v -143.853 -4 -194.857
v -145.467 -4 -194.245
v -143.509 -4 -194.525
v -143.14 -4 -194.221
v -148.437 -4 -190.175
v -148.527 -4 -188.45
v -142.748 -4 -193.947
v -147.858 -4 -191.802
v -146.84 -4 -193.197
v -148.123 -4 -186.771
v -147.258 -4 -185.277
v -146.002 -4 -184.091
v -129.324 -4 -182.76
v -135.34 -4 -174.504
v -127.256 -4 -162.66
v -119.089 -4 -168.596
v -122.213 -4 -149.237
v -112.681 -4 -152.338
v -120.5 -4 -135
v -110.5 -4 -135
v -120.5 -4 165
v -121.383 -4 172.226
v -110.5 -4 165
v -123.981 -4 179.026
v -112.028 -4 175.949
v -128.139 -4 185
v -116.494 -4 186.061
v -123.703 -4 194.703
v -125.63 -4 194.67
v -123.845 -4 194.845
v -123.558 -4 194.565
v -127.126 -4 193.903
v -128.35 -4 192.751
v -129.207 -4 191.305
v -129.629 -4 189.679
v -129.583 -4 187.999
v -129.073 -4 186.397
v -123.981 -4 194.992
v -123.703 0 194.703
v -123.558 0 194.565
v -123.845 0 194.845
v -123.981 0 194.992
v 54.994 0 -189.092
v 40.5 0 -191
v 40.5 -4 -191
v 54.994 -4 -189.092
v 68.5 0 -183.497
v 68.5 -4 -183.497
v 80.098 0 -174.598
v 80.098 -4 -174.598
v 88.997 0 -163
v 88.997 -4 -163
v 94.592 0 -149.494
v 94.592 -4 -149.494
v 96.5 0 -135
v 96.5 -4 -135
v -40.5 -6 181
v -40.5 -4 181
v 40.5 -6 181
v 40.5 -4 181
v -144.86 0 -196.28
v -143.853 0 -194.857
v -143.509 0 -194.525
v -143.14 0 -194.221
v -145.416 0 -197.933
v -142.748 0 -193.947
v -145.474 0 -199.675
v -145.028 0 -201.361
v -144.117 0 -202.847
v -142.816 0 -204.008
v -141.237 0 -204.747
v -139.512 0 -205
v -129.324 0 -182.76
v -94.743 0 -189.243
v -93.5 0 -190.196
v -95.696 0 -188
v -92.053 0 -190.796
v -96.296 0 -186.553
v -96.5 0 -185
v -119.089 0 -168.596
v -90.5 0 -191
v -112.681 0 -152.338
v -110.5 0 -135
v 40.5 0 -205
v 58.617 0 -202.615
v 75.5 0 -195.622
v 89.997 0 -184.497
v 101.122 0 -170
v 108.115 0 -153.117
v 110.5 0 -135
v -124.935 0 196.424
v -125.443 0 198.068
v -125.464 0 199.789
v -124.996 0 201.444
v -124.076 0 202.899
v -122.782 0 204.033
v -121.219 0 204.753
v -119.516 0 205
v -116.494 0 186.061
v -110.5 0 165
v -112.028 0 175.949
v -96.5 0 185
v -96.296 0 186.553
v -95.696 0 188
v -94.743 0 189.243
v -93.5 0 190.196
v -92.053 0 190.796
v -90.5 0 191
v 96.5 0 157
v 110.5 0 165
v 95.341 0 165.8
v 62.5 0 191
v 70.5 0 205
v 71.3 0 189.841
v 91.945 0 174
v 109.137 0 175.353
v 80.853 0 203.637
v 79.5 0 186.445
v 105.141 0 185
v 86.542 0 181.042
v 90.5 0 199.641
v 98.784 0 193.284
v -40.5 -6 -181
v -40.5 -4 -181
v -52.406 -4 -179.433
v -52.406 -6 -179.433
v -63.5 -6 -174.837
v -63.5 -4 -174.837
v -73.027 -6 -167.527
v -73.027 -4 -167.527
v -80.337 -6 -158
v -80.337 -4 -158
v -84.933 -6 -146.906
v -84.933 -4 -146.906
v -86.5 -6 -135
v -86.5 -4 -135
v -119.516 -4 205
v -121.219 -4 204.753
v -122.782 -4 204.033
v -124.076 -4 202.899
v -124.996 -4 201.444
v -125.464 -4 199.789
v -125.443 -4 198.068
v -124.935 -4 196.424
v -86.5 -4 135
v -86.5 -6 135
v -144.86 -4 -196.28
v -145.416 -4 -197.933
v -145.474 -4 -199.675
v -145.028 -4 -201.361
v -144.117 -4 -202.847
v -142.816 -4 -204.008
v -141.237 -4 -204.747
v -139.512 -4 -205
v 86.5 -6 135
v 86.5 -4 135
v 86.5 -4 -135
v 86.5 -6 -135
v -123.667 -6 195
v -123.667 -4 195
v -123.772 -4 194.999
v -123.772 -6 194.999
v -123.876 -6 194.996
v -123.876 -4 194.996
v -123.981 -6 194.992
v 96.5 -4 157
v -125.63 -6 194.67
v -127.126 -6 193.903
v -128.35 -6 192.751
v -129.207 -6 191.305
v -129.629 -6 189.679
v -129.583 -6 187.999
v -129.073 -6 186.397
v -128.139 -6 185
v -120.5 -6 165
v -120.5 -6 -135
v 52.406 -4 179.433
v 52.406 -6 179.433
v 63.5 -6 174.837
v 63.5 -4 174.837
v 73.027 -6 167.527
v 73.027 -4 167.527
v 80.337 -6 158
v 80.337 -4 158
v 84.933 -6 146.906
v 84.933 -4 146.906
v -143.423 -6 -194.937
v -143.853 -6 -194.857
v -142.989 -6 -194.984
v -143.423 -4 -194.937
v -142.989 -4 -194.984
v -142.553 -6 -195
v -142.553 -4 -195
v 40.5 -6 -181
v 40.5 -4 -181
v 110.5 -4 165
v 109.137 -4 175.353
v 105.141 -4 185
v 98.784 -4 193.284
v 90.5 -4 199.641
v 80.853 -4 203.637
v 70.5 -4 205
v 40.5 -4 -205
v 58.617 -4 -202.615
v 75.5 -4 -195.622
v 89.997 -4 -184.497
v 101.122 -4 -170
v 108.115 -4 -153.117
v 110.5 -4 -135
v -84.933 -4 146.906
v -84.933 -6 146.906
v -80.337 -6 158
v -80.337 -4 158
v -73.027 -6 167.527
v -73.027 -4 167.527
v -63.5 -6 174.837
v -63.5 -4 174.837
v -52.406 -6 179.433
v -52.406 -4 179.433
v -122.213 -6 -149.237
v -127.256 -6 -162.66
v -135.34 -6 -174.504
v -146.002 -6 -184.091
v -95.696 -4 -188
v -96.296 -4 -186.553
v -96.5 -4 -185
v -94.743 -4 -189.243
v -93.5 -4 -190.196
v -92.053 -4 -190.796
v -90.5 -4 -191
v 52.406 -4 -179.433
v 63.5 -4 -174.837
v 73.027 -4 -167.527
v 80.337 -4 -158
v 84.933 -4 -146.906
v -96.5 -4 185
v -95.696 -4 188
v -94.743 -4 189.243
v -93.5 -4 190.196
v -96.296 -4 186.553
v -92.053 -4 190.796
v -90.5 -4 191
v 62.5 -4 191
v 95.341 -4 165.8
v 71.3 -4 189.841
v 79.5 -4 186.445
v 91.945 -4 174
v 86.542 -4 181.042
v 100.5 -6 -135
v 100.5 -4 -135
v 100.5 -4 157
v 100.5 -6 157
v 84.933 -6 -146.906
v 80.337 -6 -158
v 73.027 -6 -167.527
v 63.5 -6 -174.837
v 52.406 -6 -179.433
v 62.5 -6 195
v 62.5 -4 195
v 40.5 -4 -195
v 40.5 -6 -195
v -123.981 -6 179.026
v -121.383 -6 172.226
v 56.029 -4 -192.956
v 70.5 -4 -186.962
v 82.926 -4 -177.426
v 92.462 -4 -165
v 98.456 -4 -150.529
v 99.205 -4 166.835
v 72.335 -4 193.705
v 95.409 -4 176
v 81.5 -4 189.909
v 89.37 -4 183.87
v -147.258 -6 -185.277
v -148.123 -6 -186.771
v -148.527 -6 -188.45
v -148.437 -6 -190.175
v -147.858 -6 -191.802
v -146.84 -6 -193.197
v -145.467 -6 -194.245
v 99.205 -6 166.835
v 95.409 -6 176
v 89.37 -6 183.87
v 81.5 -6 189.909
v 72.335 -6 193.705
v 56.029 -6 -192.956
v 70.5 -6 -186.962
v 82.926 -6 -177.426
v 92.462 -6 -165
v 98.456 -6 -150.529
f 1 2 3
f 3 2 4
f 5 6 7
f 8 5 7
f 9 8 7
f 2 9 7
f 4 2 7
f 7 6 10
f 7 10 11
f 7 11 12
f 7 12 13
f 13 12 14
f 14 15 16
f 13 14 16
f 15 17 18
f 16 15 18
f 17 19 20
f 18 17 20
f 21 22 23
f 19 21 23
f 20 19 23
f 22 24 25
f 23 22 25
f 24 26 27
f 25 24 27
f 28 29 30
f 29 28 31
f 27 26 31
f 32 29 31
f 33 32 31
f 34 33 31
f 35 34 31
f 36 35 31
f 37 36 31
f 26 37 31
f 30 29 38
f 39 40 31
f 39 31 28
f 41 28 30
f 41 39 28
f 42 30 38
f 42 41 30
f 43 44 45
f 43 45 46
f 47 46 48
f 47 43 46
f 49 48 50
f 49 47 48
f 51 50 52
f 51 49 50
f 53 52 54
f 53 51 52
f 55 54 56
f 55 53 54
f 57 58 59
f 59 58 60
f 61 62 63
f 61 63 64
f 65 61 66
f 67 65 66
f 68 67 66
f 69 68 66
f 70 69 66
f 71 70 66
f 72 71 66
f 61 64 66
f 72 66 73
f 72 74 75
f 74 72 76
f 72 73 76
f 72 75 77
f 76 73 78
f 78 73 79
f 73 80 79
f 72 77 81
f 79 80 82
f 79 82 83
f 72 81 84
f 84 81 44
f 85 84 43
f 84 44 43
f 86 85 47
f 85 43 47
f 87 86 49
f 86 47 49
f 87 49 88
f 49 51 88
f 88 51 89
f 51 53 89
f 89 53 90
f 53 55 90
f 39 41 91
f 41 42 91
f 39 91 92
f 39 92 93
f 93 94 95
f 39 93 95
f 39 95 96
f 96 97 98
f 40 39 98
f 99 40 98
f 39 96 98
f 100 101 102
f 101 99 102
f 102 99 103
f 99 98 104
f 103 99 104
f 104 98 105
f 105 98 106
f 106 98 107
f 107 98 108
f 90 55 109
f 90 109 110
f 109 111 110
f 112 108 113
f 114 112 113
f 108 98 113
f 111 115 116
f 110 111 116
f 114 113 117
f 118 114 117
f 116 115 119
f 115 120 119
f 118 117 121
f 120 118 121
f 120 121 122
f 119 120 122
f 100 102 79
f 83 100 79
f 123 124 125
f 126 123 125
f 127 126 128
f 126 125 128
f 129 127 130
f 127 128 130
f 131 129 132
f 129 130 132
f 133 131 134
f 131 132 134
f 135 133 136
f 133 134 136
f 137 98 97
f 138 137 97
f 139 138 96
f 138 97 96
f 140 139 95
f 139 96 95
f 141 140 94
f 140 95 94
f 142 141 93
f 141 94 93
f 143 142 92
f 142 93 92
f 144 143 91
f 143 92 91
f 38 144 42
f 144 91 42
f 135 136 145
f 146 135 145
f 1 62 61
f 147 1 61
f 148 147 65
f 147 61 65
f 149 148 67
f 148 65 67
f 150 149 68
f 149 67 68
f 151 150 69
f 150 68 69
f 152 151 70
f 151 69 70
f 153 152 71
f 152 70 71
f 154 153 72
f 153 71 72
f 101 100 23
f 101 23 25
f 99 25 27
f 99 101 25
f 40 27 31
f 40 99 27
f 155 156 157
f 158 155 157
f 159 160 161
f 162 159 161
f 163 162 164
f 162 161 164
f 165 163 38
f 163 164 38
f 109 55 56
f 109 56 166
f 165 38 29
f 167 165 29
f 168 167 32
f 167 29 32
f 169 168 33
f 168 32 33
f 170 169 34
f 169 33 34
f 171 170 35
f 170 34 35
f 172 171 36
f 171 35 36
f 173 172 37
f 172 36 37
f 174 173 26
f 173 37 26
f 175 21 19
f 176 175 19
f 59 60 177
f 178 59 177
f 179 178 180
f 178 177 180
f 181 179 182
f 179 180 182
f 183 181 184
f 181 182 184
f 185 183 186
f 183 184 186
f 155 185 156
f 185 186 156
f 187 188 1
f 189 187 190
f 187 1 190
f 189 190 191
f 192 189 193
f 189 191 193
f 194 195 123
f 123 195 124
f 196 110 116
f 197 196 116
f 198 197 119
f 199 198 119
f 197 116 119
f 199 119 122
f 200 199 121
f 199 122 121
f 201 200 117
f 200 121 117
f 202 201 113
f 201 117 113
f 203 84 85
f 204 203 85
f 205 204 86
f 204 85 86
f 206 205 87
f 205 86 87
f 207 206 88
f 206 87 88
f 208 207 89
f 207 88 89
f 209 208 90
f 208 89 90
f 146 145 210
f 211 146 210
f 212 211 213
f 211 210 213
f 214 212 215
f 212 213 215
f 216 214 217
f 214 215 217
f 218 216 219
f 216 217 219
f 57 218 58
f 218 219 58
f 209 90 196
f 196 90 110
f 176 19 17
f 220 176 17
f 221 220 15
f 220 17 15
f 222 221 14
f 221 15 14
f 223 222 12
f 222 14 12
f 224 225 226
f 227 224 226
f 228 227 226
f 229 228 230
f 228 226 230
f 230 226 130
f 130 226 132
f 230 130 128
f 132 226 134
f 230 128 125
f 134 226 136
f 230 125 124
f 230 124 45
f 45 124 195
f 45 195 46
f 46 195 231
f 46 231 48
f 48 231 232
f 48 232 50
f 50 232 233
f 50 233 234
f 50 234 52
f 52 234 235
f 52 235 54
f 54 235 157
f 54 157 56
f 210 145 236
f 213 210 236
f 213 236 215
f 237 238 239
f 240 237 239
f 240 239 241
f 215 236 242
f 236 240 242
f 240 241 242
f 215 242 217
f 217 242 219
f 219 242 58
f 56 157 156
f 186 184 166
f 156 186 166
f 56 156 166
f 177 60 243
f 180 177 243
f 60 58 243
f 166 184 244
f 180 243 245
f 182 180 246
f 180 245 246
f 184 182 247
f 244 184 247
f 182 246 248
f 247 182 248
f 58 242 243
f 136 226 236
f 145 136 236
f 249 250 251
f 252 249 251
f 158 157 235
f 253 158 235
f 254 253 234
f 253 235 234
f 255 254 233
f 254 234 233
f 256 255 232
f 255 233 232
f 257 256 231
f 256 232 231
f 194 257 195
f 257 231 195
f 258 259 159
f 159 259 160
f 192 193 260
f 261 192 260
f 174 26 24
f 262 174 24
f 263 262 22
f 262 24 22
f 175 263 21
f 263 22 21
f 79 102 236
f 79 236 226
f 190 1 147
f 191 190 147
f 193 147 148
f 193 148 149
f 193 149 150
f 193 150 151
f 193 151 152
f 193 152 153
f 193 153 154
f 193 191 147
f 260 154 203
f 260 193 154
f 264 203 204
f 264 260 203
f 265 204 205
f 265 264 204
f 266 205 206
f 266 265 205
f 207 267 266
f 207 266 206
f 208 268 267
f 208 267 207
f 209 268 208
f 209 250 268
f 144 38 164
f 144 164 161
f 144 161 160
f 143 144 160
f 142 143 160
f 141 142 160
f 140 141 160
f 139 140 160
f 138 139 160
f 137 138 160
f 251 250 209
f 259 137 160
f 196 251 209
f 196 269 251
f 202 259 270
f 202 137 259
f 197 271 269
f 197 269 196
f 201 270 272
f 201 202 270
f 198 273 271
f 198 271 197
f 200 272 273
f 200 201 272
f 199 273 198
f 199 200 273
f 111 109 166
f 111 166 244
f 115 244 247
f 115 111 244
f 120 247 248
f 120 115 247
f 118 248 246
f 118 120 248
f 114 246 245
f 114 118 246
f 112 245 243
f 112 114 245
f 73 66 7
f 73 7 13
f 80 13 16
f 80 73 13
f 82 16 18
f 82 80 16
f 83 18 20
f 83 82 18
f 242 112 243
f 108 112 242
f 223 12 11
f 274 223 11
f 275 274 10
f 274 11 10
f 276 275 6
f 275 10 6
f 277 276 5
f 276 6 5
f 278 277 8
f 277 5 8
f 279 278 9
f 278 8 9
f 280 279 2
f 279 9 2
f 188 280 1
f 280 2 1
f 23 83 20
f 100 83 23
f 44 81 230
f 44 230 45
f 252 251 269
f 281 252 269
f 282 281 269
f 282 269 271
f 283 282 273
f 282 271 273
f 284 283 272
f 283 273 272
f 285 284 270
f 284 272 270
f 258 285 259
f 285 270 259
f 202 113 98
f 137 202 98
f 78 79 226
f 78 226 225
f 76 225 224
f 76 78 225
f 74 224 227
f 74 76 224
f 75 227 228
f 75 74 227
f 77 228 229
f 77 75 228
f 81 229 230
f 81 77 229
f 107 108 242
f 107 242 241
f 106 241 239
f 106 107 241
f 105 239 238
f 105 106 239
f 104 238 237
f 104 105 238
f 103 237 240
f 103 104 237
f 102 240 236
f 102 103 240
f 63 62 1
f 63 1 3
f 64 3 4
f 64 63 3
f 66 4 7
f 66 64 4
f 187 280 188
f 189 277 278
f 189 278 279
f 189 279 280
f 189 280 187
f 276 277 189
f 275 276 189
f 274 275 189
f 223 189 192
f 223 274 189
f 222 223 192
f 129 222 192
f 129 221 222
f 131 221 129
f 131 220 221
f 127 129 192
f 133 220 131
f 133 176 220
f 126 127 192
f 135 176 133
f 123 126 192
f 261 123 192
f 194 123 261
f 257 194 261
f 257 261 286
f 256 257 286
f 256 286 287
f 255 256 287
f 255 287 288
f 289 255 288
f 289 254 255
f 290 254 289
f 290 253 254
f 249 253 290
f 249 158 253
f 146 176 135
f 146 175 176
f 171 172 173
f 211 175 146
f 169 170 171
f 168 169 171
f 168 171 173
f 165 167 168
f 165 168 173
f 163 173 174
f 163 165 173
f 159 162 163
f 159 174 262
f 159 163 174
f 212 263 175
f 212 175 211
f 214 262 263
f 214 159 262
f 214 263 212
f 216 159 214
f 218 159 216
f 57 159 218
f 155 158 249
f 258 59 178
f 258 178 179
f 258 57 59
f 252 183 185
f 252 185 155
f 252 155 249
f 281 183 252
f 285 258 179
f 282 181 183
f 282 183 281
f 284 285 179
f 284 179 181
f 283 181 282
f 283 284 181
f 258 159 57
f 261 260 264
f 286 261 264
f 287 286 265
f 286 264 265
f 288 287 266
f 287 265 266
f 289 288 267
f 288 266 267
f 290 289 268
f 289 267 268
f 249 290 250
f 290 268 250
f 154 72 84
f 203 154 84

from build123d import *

# Parameters (mm, degrees)
F1_DEPTH = 6
F2_DEPTH = 4
F3_DEPTH = 4
F4_DEPTH = 4


# Not quite as in the source:
# - a feature names something its author has since deleted; it is built from what else it names


with BuildPart() as f1:
    # F0 (on Front) → F1 (new body)
    with BuildSketch(Plane.XZ):
        with BuildLine():
            Line((-100.5, 195), (-100.5, -195))
            Line((-100.5, -195), (-40.5, -195))
            Line((-40.5, -195), (40.5, -195))
            ThreePointArc((40.5, -195), (82.9264068712, -177.4264068712), (100.5, -135))
            Line((100.5, -135), (100.5, 157))
            ThreePointArc((100.5, 157), (89.3700576851, 183.8700576851), (62.5, 195))
            Line((62.5, 195), (-100.5, 195))
        make_face()
        with BuildLine():
            Line((96.5, 157), (96.5, -135))
            ThreePointArc((96.5, -135), (80.0979797464, -174.5979797464), (40.5, -191))
            Line((40.5, -191), (-90.5, -191))
            ThreePointArc((-90.5, -191), (-94.7426406871, -189.2426406871), (-96.5, -185))
            Line((-96.5, -185), (-96.5, 185))
            ThreePointArc((-96.5, 185), (-94.7426406871, 189.2426406871), (-90.5, 191))
            Line((-90.5, 191), (62.5, 191))
            ThreePointArc((62.5, 191), (86.5416305603, 181.0416305603), (96.5, 157))
        make_face(mode=Mode.SUBTRACT)
        with BuildLine():
            ThreePointArc((-142.7480761254, -193.9473684211), (-143.3275959396, -194.3693704052), (-143.8526478713, -194.8574783429))
            ThreePointArc((-143.8526478713, -194.8574783429), (-143.2065526025, -194.9642631589), (-142.552668078, -195))
            Line((-142.552668078, -195), (-100.5, -195))
            Line((-100.5, -195), (-100.5, 195))
            Line((-100.5, 195), (-123.66718427, 195))
            ThreePointArc((-123.66718427, 195), (-123.8241029609, 194.9979476927), (-123.9809143034, 194.9917921748))
            ThreePointArc((-123.9809143034, 194.9917921748), (-123.7745554417, 194.7731997599), (-123.5575071568, 194.5652173913))
            ThreePointArc((-123.5575071568, 194.5652173913), (-113.9097026951, 181.1601405667), (-110.5, 165))
            Line((-110.5, 165), (-110.5, -135))
            ThreePointArc((-110.5, -135), (-119.0889477731, -168.5958727285), (-142.7480761254, -193.9473684211))
        make_face()
        with BuildLine():
            ThreePointArc((-146.0024255254, -184.0909090909), (-148.4365234746, -190.1748385726), (-143.8526478713, -194.8574783429))
            ThreePointArc((-143.8526478713, -194.8574783429), (-143.3275959396, -194.3693704052), (-142.7480761254, -193.9473684211))
            ThreePointArc((-142.7480761254, -193.9473684211), (-119.0889477731, -168.5958727285), (-110.5, -135))
            Line((-110.5, -135), (-110.5, 165))
            ThreePointArc((-110.5, 165), (-113.9097026951, 181.1601405667), (-123.5575071568, 194.5652173913))
            ThreePointArc((-123.5575071568, 194.5652173913), (-123.7745554417, 194.7731997599), (-123.9809143034, 194.9917921748))
            ThreePointArc((-123.9809143034, 194.9917921748), (-129.2065981407, 191.3054053807), (-128.139320225, 185))
            ThreePointArc((-128.139320225, 185), (-122.4748292311, 175.7046626932), (-120.5, 165))
            Line((-120.5, 165), (-120.5, -135))
            ThreePointArc((-120.5, -135), (-127.2559652709, -162.6599487665), (-146.0024255254, -184.0909090909))
        make_face()
        with BuildLine():
            ThreePointArc((40.5, -191), (80.0979797464, -174.5979797464), (96.5, -135))
            Line((96.5, -135), (96.5, 157))
            ThreePointArc((96.5, 157), (86.5416305603, 181.0416305603), (62.5, 191))
            Line((62.5, 191), (-90.5, 191))
            ThreePointArc((-90.5, 191), (-94.7426406871, 189.2426406871), (-96.5, 185))
            Line((-96.5, 185), (-96.5, -185))
            ThreePointArc((-96.5, -185), (-94.7426406871, -189.2426406871), (-90.5, -191))
            Line((-90.5, -191), (40.5, -191))
        make_face()
        with BuildLine():
            Line((86.5, 135), (86.5, -135))
            ThreePointArc((86.5, -135), (73.0269119346, -167.5269119346), (40.5, -181))
            Line((40.5, -181), (-40.5, -181))
            ThreePointArc((-40.5, -181), (-73.0269119346, -167.5269119346), (-86.5, -135))
            Line((-86.5, -135), (-86.5, 135))
            ThreePointArc((-86.5, 135), (-73.0269119346, 167.5269119346), (-40.5, 181))
            Line((-40.5, 181), (40.5, 181))
            ThreePointArc((40.5, 181), (73.0269119346, 167.5269119346), (86.5, 135))
        make_face(mode=Mode.SUBTRACT)
    extrude(amount=F1_DEPTH)

    # F0 (on Front) → F2 (join)
    with BuildSketch(Plane.XZ):
        with BuildLine():
            Line((-110.5, -205), (40.5, -205))
            ThreePointArc((40.5, -205), (89.9974746831, -184.4974746831), (110.5, -135))
            Line((110.5, -135), (110.5, 165))
            ThreePointArc((110.5, 165), (98.7842712475, 193.2842712475), (70.5, 205))
            Line((70.5, 205), (-110.5, 205))
            Line((-110.5, 205), (-119.5161332303, 205))
            ThreePointArc((-119.5161332303, 205), (-124.9956061498, 201.4444583295), (-123.9809143034, 194.9917921748))
            ThreePointArc((-123.9809143034, 194.9917921748), (-123.8241029609, 194.9979476927), (-123.66718427, 195))
            Line((-123.66718427, 195), (-100.5, 195))
            Line((-100.5, 195), (62.5, 195))
            ThreePointArc((62.5, 195), (89.3700576851, 183.8700576851), (100.5, 157))
            Line((100.5, 157), (100.5, -135))
            ThreePointArc((100.5, -135), (82.9264068712, -177.4264068712), (40.5, -195))
            Line((40.5, -195), (-40.5, -195))
            Line((-40.5, -195), (-100.5, -195))
            Line((-100.5, -195), (-142.552668078, -195))
            ThreePointArc((-142.552668078, -195), (-143.2065526025, -194.9642631589), (-143.8526478713, -194.8574783429))
            ThreePointArc((-143.8526478713, -194.8574783429), (-145.0283155871, -201.3606005652), (-139.5121969362, -205))
            Line((-139.5121969362, -205), (-110.5, -205))
        make_face()
    extrude(amount=F2_DEPTH)

    # F0 (on Front) → F3 (cut)
    with BuildSketch(Plane.XZ):
        with BuildLine():
            ThreePointArc((-146.0024255254, -184.0909090909), (-148.4365234746, -190.1748385726), (-143.8526478713, -194.8574783429))
            ThreePointArc((-143.8526478713, -194.8574783429), (-143.3275959396, -194.3693704052), (-142.7480761254, -193.9473684211))
            ThreePointArc((-142.7480761254, -193.9473684211), (-119.0889477731, -168.5958727285), (-110.5, -135))
            Line((-110.5, -135), (-110.5, 165))
            ThreePointArc((-110.5, 165), (-113.9097026951, 181.1601405667), (-123.5575071568, 194.5652173913))
            ThreePointArc((-123.5575071568, 194.5652173913), (-123.7745554417, 194.7731997599), (-123.9809143034, 194.9917921748))
            ThreePointArc((-123.9809143034, 194.9917921748), (-129.2065981407, 191.3054053807), (-128.139320225, 185))
            ThreePointArc((-128.139320225, 185), (-122.4748292311, 175.7046626932), (-120.5, 165))
            Line((-120.5, 165), (-120.5, -135))
            ThreePointArc((-120.5, -135), (-127.2559652709, -162.6599487665), (-146.0024255254, -184.0909090909))
        make_face()
    extrude(amount=F3_DEPTH, mode=Mode.SUBTRACT)

    # F0 (on Front) → F4 (cut)
    with BuildSketch(Plane.XZ):
        with BuildLine():
            ThreePointArc((40.5, -191), (80.0979797464, -174.5979797464), (96.5, -135))
            Line((96.5, -135), (96.5, 157))
            ThreePointArc((96.5, 157), (86.5416305603, 181.0416305603), (62.5, 191))
            Line((62.5, 191), (-90.5, 191))
            ThreePointArc((-90.5, 191), (-94.7426406871, 189.2426406871), (-96.5, 185))
            Line((-96.5, 185), (-96.5, -185))
            ThreePointArc((-96.5, -185), (-94.7426406871, -189.2426406871), (-90.5, -191))
            Line((-90.5, -191), (40.5, -191))
        make_face()
        with BuildLine():
            Line((86.5, 135), (86.5, -135))
            ThreePointArc((86.5, -135), (73.0269119346, -167.5269119346), (40.5, -181))
            Line((40.5, -181), (-40.5, -181))
            ThreePointArc((-40.5, -181), (-73.0269119346, -167.5269119346), (-86.5, -135))
            Line((-86.5, -135), (-86.5, 135))
            ThreePointArc((-86.5, 135), (-73.0269119346, 167.5269119346), (-40.5, 181))
            Line((-40.5, 181), (40.5, 181))
            ThreePointArc((40.5, 181), (73.0269119346, 167.5269119346), (86.5, 135))
        make_face(mode=Mode.SUBTRACT)
    extrude(amount=F4_DEPTH, mode=Mode.SUBTRACT)


solid = f1.part
